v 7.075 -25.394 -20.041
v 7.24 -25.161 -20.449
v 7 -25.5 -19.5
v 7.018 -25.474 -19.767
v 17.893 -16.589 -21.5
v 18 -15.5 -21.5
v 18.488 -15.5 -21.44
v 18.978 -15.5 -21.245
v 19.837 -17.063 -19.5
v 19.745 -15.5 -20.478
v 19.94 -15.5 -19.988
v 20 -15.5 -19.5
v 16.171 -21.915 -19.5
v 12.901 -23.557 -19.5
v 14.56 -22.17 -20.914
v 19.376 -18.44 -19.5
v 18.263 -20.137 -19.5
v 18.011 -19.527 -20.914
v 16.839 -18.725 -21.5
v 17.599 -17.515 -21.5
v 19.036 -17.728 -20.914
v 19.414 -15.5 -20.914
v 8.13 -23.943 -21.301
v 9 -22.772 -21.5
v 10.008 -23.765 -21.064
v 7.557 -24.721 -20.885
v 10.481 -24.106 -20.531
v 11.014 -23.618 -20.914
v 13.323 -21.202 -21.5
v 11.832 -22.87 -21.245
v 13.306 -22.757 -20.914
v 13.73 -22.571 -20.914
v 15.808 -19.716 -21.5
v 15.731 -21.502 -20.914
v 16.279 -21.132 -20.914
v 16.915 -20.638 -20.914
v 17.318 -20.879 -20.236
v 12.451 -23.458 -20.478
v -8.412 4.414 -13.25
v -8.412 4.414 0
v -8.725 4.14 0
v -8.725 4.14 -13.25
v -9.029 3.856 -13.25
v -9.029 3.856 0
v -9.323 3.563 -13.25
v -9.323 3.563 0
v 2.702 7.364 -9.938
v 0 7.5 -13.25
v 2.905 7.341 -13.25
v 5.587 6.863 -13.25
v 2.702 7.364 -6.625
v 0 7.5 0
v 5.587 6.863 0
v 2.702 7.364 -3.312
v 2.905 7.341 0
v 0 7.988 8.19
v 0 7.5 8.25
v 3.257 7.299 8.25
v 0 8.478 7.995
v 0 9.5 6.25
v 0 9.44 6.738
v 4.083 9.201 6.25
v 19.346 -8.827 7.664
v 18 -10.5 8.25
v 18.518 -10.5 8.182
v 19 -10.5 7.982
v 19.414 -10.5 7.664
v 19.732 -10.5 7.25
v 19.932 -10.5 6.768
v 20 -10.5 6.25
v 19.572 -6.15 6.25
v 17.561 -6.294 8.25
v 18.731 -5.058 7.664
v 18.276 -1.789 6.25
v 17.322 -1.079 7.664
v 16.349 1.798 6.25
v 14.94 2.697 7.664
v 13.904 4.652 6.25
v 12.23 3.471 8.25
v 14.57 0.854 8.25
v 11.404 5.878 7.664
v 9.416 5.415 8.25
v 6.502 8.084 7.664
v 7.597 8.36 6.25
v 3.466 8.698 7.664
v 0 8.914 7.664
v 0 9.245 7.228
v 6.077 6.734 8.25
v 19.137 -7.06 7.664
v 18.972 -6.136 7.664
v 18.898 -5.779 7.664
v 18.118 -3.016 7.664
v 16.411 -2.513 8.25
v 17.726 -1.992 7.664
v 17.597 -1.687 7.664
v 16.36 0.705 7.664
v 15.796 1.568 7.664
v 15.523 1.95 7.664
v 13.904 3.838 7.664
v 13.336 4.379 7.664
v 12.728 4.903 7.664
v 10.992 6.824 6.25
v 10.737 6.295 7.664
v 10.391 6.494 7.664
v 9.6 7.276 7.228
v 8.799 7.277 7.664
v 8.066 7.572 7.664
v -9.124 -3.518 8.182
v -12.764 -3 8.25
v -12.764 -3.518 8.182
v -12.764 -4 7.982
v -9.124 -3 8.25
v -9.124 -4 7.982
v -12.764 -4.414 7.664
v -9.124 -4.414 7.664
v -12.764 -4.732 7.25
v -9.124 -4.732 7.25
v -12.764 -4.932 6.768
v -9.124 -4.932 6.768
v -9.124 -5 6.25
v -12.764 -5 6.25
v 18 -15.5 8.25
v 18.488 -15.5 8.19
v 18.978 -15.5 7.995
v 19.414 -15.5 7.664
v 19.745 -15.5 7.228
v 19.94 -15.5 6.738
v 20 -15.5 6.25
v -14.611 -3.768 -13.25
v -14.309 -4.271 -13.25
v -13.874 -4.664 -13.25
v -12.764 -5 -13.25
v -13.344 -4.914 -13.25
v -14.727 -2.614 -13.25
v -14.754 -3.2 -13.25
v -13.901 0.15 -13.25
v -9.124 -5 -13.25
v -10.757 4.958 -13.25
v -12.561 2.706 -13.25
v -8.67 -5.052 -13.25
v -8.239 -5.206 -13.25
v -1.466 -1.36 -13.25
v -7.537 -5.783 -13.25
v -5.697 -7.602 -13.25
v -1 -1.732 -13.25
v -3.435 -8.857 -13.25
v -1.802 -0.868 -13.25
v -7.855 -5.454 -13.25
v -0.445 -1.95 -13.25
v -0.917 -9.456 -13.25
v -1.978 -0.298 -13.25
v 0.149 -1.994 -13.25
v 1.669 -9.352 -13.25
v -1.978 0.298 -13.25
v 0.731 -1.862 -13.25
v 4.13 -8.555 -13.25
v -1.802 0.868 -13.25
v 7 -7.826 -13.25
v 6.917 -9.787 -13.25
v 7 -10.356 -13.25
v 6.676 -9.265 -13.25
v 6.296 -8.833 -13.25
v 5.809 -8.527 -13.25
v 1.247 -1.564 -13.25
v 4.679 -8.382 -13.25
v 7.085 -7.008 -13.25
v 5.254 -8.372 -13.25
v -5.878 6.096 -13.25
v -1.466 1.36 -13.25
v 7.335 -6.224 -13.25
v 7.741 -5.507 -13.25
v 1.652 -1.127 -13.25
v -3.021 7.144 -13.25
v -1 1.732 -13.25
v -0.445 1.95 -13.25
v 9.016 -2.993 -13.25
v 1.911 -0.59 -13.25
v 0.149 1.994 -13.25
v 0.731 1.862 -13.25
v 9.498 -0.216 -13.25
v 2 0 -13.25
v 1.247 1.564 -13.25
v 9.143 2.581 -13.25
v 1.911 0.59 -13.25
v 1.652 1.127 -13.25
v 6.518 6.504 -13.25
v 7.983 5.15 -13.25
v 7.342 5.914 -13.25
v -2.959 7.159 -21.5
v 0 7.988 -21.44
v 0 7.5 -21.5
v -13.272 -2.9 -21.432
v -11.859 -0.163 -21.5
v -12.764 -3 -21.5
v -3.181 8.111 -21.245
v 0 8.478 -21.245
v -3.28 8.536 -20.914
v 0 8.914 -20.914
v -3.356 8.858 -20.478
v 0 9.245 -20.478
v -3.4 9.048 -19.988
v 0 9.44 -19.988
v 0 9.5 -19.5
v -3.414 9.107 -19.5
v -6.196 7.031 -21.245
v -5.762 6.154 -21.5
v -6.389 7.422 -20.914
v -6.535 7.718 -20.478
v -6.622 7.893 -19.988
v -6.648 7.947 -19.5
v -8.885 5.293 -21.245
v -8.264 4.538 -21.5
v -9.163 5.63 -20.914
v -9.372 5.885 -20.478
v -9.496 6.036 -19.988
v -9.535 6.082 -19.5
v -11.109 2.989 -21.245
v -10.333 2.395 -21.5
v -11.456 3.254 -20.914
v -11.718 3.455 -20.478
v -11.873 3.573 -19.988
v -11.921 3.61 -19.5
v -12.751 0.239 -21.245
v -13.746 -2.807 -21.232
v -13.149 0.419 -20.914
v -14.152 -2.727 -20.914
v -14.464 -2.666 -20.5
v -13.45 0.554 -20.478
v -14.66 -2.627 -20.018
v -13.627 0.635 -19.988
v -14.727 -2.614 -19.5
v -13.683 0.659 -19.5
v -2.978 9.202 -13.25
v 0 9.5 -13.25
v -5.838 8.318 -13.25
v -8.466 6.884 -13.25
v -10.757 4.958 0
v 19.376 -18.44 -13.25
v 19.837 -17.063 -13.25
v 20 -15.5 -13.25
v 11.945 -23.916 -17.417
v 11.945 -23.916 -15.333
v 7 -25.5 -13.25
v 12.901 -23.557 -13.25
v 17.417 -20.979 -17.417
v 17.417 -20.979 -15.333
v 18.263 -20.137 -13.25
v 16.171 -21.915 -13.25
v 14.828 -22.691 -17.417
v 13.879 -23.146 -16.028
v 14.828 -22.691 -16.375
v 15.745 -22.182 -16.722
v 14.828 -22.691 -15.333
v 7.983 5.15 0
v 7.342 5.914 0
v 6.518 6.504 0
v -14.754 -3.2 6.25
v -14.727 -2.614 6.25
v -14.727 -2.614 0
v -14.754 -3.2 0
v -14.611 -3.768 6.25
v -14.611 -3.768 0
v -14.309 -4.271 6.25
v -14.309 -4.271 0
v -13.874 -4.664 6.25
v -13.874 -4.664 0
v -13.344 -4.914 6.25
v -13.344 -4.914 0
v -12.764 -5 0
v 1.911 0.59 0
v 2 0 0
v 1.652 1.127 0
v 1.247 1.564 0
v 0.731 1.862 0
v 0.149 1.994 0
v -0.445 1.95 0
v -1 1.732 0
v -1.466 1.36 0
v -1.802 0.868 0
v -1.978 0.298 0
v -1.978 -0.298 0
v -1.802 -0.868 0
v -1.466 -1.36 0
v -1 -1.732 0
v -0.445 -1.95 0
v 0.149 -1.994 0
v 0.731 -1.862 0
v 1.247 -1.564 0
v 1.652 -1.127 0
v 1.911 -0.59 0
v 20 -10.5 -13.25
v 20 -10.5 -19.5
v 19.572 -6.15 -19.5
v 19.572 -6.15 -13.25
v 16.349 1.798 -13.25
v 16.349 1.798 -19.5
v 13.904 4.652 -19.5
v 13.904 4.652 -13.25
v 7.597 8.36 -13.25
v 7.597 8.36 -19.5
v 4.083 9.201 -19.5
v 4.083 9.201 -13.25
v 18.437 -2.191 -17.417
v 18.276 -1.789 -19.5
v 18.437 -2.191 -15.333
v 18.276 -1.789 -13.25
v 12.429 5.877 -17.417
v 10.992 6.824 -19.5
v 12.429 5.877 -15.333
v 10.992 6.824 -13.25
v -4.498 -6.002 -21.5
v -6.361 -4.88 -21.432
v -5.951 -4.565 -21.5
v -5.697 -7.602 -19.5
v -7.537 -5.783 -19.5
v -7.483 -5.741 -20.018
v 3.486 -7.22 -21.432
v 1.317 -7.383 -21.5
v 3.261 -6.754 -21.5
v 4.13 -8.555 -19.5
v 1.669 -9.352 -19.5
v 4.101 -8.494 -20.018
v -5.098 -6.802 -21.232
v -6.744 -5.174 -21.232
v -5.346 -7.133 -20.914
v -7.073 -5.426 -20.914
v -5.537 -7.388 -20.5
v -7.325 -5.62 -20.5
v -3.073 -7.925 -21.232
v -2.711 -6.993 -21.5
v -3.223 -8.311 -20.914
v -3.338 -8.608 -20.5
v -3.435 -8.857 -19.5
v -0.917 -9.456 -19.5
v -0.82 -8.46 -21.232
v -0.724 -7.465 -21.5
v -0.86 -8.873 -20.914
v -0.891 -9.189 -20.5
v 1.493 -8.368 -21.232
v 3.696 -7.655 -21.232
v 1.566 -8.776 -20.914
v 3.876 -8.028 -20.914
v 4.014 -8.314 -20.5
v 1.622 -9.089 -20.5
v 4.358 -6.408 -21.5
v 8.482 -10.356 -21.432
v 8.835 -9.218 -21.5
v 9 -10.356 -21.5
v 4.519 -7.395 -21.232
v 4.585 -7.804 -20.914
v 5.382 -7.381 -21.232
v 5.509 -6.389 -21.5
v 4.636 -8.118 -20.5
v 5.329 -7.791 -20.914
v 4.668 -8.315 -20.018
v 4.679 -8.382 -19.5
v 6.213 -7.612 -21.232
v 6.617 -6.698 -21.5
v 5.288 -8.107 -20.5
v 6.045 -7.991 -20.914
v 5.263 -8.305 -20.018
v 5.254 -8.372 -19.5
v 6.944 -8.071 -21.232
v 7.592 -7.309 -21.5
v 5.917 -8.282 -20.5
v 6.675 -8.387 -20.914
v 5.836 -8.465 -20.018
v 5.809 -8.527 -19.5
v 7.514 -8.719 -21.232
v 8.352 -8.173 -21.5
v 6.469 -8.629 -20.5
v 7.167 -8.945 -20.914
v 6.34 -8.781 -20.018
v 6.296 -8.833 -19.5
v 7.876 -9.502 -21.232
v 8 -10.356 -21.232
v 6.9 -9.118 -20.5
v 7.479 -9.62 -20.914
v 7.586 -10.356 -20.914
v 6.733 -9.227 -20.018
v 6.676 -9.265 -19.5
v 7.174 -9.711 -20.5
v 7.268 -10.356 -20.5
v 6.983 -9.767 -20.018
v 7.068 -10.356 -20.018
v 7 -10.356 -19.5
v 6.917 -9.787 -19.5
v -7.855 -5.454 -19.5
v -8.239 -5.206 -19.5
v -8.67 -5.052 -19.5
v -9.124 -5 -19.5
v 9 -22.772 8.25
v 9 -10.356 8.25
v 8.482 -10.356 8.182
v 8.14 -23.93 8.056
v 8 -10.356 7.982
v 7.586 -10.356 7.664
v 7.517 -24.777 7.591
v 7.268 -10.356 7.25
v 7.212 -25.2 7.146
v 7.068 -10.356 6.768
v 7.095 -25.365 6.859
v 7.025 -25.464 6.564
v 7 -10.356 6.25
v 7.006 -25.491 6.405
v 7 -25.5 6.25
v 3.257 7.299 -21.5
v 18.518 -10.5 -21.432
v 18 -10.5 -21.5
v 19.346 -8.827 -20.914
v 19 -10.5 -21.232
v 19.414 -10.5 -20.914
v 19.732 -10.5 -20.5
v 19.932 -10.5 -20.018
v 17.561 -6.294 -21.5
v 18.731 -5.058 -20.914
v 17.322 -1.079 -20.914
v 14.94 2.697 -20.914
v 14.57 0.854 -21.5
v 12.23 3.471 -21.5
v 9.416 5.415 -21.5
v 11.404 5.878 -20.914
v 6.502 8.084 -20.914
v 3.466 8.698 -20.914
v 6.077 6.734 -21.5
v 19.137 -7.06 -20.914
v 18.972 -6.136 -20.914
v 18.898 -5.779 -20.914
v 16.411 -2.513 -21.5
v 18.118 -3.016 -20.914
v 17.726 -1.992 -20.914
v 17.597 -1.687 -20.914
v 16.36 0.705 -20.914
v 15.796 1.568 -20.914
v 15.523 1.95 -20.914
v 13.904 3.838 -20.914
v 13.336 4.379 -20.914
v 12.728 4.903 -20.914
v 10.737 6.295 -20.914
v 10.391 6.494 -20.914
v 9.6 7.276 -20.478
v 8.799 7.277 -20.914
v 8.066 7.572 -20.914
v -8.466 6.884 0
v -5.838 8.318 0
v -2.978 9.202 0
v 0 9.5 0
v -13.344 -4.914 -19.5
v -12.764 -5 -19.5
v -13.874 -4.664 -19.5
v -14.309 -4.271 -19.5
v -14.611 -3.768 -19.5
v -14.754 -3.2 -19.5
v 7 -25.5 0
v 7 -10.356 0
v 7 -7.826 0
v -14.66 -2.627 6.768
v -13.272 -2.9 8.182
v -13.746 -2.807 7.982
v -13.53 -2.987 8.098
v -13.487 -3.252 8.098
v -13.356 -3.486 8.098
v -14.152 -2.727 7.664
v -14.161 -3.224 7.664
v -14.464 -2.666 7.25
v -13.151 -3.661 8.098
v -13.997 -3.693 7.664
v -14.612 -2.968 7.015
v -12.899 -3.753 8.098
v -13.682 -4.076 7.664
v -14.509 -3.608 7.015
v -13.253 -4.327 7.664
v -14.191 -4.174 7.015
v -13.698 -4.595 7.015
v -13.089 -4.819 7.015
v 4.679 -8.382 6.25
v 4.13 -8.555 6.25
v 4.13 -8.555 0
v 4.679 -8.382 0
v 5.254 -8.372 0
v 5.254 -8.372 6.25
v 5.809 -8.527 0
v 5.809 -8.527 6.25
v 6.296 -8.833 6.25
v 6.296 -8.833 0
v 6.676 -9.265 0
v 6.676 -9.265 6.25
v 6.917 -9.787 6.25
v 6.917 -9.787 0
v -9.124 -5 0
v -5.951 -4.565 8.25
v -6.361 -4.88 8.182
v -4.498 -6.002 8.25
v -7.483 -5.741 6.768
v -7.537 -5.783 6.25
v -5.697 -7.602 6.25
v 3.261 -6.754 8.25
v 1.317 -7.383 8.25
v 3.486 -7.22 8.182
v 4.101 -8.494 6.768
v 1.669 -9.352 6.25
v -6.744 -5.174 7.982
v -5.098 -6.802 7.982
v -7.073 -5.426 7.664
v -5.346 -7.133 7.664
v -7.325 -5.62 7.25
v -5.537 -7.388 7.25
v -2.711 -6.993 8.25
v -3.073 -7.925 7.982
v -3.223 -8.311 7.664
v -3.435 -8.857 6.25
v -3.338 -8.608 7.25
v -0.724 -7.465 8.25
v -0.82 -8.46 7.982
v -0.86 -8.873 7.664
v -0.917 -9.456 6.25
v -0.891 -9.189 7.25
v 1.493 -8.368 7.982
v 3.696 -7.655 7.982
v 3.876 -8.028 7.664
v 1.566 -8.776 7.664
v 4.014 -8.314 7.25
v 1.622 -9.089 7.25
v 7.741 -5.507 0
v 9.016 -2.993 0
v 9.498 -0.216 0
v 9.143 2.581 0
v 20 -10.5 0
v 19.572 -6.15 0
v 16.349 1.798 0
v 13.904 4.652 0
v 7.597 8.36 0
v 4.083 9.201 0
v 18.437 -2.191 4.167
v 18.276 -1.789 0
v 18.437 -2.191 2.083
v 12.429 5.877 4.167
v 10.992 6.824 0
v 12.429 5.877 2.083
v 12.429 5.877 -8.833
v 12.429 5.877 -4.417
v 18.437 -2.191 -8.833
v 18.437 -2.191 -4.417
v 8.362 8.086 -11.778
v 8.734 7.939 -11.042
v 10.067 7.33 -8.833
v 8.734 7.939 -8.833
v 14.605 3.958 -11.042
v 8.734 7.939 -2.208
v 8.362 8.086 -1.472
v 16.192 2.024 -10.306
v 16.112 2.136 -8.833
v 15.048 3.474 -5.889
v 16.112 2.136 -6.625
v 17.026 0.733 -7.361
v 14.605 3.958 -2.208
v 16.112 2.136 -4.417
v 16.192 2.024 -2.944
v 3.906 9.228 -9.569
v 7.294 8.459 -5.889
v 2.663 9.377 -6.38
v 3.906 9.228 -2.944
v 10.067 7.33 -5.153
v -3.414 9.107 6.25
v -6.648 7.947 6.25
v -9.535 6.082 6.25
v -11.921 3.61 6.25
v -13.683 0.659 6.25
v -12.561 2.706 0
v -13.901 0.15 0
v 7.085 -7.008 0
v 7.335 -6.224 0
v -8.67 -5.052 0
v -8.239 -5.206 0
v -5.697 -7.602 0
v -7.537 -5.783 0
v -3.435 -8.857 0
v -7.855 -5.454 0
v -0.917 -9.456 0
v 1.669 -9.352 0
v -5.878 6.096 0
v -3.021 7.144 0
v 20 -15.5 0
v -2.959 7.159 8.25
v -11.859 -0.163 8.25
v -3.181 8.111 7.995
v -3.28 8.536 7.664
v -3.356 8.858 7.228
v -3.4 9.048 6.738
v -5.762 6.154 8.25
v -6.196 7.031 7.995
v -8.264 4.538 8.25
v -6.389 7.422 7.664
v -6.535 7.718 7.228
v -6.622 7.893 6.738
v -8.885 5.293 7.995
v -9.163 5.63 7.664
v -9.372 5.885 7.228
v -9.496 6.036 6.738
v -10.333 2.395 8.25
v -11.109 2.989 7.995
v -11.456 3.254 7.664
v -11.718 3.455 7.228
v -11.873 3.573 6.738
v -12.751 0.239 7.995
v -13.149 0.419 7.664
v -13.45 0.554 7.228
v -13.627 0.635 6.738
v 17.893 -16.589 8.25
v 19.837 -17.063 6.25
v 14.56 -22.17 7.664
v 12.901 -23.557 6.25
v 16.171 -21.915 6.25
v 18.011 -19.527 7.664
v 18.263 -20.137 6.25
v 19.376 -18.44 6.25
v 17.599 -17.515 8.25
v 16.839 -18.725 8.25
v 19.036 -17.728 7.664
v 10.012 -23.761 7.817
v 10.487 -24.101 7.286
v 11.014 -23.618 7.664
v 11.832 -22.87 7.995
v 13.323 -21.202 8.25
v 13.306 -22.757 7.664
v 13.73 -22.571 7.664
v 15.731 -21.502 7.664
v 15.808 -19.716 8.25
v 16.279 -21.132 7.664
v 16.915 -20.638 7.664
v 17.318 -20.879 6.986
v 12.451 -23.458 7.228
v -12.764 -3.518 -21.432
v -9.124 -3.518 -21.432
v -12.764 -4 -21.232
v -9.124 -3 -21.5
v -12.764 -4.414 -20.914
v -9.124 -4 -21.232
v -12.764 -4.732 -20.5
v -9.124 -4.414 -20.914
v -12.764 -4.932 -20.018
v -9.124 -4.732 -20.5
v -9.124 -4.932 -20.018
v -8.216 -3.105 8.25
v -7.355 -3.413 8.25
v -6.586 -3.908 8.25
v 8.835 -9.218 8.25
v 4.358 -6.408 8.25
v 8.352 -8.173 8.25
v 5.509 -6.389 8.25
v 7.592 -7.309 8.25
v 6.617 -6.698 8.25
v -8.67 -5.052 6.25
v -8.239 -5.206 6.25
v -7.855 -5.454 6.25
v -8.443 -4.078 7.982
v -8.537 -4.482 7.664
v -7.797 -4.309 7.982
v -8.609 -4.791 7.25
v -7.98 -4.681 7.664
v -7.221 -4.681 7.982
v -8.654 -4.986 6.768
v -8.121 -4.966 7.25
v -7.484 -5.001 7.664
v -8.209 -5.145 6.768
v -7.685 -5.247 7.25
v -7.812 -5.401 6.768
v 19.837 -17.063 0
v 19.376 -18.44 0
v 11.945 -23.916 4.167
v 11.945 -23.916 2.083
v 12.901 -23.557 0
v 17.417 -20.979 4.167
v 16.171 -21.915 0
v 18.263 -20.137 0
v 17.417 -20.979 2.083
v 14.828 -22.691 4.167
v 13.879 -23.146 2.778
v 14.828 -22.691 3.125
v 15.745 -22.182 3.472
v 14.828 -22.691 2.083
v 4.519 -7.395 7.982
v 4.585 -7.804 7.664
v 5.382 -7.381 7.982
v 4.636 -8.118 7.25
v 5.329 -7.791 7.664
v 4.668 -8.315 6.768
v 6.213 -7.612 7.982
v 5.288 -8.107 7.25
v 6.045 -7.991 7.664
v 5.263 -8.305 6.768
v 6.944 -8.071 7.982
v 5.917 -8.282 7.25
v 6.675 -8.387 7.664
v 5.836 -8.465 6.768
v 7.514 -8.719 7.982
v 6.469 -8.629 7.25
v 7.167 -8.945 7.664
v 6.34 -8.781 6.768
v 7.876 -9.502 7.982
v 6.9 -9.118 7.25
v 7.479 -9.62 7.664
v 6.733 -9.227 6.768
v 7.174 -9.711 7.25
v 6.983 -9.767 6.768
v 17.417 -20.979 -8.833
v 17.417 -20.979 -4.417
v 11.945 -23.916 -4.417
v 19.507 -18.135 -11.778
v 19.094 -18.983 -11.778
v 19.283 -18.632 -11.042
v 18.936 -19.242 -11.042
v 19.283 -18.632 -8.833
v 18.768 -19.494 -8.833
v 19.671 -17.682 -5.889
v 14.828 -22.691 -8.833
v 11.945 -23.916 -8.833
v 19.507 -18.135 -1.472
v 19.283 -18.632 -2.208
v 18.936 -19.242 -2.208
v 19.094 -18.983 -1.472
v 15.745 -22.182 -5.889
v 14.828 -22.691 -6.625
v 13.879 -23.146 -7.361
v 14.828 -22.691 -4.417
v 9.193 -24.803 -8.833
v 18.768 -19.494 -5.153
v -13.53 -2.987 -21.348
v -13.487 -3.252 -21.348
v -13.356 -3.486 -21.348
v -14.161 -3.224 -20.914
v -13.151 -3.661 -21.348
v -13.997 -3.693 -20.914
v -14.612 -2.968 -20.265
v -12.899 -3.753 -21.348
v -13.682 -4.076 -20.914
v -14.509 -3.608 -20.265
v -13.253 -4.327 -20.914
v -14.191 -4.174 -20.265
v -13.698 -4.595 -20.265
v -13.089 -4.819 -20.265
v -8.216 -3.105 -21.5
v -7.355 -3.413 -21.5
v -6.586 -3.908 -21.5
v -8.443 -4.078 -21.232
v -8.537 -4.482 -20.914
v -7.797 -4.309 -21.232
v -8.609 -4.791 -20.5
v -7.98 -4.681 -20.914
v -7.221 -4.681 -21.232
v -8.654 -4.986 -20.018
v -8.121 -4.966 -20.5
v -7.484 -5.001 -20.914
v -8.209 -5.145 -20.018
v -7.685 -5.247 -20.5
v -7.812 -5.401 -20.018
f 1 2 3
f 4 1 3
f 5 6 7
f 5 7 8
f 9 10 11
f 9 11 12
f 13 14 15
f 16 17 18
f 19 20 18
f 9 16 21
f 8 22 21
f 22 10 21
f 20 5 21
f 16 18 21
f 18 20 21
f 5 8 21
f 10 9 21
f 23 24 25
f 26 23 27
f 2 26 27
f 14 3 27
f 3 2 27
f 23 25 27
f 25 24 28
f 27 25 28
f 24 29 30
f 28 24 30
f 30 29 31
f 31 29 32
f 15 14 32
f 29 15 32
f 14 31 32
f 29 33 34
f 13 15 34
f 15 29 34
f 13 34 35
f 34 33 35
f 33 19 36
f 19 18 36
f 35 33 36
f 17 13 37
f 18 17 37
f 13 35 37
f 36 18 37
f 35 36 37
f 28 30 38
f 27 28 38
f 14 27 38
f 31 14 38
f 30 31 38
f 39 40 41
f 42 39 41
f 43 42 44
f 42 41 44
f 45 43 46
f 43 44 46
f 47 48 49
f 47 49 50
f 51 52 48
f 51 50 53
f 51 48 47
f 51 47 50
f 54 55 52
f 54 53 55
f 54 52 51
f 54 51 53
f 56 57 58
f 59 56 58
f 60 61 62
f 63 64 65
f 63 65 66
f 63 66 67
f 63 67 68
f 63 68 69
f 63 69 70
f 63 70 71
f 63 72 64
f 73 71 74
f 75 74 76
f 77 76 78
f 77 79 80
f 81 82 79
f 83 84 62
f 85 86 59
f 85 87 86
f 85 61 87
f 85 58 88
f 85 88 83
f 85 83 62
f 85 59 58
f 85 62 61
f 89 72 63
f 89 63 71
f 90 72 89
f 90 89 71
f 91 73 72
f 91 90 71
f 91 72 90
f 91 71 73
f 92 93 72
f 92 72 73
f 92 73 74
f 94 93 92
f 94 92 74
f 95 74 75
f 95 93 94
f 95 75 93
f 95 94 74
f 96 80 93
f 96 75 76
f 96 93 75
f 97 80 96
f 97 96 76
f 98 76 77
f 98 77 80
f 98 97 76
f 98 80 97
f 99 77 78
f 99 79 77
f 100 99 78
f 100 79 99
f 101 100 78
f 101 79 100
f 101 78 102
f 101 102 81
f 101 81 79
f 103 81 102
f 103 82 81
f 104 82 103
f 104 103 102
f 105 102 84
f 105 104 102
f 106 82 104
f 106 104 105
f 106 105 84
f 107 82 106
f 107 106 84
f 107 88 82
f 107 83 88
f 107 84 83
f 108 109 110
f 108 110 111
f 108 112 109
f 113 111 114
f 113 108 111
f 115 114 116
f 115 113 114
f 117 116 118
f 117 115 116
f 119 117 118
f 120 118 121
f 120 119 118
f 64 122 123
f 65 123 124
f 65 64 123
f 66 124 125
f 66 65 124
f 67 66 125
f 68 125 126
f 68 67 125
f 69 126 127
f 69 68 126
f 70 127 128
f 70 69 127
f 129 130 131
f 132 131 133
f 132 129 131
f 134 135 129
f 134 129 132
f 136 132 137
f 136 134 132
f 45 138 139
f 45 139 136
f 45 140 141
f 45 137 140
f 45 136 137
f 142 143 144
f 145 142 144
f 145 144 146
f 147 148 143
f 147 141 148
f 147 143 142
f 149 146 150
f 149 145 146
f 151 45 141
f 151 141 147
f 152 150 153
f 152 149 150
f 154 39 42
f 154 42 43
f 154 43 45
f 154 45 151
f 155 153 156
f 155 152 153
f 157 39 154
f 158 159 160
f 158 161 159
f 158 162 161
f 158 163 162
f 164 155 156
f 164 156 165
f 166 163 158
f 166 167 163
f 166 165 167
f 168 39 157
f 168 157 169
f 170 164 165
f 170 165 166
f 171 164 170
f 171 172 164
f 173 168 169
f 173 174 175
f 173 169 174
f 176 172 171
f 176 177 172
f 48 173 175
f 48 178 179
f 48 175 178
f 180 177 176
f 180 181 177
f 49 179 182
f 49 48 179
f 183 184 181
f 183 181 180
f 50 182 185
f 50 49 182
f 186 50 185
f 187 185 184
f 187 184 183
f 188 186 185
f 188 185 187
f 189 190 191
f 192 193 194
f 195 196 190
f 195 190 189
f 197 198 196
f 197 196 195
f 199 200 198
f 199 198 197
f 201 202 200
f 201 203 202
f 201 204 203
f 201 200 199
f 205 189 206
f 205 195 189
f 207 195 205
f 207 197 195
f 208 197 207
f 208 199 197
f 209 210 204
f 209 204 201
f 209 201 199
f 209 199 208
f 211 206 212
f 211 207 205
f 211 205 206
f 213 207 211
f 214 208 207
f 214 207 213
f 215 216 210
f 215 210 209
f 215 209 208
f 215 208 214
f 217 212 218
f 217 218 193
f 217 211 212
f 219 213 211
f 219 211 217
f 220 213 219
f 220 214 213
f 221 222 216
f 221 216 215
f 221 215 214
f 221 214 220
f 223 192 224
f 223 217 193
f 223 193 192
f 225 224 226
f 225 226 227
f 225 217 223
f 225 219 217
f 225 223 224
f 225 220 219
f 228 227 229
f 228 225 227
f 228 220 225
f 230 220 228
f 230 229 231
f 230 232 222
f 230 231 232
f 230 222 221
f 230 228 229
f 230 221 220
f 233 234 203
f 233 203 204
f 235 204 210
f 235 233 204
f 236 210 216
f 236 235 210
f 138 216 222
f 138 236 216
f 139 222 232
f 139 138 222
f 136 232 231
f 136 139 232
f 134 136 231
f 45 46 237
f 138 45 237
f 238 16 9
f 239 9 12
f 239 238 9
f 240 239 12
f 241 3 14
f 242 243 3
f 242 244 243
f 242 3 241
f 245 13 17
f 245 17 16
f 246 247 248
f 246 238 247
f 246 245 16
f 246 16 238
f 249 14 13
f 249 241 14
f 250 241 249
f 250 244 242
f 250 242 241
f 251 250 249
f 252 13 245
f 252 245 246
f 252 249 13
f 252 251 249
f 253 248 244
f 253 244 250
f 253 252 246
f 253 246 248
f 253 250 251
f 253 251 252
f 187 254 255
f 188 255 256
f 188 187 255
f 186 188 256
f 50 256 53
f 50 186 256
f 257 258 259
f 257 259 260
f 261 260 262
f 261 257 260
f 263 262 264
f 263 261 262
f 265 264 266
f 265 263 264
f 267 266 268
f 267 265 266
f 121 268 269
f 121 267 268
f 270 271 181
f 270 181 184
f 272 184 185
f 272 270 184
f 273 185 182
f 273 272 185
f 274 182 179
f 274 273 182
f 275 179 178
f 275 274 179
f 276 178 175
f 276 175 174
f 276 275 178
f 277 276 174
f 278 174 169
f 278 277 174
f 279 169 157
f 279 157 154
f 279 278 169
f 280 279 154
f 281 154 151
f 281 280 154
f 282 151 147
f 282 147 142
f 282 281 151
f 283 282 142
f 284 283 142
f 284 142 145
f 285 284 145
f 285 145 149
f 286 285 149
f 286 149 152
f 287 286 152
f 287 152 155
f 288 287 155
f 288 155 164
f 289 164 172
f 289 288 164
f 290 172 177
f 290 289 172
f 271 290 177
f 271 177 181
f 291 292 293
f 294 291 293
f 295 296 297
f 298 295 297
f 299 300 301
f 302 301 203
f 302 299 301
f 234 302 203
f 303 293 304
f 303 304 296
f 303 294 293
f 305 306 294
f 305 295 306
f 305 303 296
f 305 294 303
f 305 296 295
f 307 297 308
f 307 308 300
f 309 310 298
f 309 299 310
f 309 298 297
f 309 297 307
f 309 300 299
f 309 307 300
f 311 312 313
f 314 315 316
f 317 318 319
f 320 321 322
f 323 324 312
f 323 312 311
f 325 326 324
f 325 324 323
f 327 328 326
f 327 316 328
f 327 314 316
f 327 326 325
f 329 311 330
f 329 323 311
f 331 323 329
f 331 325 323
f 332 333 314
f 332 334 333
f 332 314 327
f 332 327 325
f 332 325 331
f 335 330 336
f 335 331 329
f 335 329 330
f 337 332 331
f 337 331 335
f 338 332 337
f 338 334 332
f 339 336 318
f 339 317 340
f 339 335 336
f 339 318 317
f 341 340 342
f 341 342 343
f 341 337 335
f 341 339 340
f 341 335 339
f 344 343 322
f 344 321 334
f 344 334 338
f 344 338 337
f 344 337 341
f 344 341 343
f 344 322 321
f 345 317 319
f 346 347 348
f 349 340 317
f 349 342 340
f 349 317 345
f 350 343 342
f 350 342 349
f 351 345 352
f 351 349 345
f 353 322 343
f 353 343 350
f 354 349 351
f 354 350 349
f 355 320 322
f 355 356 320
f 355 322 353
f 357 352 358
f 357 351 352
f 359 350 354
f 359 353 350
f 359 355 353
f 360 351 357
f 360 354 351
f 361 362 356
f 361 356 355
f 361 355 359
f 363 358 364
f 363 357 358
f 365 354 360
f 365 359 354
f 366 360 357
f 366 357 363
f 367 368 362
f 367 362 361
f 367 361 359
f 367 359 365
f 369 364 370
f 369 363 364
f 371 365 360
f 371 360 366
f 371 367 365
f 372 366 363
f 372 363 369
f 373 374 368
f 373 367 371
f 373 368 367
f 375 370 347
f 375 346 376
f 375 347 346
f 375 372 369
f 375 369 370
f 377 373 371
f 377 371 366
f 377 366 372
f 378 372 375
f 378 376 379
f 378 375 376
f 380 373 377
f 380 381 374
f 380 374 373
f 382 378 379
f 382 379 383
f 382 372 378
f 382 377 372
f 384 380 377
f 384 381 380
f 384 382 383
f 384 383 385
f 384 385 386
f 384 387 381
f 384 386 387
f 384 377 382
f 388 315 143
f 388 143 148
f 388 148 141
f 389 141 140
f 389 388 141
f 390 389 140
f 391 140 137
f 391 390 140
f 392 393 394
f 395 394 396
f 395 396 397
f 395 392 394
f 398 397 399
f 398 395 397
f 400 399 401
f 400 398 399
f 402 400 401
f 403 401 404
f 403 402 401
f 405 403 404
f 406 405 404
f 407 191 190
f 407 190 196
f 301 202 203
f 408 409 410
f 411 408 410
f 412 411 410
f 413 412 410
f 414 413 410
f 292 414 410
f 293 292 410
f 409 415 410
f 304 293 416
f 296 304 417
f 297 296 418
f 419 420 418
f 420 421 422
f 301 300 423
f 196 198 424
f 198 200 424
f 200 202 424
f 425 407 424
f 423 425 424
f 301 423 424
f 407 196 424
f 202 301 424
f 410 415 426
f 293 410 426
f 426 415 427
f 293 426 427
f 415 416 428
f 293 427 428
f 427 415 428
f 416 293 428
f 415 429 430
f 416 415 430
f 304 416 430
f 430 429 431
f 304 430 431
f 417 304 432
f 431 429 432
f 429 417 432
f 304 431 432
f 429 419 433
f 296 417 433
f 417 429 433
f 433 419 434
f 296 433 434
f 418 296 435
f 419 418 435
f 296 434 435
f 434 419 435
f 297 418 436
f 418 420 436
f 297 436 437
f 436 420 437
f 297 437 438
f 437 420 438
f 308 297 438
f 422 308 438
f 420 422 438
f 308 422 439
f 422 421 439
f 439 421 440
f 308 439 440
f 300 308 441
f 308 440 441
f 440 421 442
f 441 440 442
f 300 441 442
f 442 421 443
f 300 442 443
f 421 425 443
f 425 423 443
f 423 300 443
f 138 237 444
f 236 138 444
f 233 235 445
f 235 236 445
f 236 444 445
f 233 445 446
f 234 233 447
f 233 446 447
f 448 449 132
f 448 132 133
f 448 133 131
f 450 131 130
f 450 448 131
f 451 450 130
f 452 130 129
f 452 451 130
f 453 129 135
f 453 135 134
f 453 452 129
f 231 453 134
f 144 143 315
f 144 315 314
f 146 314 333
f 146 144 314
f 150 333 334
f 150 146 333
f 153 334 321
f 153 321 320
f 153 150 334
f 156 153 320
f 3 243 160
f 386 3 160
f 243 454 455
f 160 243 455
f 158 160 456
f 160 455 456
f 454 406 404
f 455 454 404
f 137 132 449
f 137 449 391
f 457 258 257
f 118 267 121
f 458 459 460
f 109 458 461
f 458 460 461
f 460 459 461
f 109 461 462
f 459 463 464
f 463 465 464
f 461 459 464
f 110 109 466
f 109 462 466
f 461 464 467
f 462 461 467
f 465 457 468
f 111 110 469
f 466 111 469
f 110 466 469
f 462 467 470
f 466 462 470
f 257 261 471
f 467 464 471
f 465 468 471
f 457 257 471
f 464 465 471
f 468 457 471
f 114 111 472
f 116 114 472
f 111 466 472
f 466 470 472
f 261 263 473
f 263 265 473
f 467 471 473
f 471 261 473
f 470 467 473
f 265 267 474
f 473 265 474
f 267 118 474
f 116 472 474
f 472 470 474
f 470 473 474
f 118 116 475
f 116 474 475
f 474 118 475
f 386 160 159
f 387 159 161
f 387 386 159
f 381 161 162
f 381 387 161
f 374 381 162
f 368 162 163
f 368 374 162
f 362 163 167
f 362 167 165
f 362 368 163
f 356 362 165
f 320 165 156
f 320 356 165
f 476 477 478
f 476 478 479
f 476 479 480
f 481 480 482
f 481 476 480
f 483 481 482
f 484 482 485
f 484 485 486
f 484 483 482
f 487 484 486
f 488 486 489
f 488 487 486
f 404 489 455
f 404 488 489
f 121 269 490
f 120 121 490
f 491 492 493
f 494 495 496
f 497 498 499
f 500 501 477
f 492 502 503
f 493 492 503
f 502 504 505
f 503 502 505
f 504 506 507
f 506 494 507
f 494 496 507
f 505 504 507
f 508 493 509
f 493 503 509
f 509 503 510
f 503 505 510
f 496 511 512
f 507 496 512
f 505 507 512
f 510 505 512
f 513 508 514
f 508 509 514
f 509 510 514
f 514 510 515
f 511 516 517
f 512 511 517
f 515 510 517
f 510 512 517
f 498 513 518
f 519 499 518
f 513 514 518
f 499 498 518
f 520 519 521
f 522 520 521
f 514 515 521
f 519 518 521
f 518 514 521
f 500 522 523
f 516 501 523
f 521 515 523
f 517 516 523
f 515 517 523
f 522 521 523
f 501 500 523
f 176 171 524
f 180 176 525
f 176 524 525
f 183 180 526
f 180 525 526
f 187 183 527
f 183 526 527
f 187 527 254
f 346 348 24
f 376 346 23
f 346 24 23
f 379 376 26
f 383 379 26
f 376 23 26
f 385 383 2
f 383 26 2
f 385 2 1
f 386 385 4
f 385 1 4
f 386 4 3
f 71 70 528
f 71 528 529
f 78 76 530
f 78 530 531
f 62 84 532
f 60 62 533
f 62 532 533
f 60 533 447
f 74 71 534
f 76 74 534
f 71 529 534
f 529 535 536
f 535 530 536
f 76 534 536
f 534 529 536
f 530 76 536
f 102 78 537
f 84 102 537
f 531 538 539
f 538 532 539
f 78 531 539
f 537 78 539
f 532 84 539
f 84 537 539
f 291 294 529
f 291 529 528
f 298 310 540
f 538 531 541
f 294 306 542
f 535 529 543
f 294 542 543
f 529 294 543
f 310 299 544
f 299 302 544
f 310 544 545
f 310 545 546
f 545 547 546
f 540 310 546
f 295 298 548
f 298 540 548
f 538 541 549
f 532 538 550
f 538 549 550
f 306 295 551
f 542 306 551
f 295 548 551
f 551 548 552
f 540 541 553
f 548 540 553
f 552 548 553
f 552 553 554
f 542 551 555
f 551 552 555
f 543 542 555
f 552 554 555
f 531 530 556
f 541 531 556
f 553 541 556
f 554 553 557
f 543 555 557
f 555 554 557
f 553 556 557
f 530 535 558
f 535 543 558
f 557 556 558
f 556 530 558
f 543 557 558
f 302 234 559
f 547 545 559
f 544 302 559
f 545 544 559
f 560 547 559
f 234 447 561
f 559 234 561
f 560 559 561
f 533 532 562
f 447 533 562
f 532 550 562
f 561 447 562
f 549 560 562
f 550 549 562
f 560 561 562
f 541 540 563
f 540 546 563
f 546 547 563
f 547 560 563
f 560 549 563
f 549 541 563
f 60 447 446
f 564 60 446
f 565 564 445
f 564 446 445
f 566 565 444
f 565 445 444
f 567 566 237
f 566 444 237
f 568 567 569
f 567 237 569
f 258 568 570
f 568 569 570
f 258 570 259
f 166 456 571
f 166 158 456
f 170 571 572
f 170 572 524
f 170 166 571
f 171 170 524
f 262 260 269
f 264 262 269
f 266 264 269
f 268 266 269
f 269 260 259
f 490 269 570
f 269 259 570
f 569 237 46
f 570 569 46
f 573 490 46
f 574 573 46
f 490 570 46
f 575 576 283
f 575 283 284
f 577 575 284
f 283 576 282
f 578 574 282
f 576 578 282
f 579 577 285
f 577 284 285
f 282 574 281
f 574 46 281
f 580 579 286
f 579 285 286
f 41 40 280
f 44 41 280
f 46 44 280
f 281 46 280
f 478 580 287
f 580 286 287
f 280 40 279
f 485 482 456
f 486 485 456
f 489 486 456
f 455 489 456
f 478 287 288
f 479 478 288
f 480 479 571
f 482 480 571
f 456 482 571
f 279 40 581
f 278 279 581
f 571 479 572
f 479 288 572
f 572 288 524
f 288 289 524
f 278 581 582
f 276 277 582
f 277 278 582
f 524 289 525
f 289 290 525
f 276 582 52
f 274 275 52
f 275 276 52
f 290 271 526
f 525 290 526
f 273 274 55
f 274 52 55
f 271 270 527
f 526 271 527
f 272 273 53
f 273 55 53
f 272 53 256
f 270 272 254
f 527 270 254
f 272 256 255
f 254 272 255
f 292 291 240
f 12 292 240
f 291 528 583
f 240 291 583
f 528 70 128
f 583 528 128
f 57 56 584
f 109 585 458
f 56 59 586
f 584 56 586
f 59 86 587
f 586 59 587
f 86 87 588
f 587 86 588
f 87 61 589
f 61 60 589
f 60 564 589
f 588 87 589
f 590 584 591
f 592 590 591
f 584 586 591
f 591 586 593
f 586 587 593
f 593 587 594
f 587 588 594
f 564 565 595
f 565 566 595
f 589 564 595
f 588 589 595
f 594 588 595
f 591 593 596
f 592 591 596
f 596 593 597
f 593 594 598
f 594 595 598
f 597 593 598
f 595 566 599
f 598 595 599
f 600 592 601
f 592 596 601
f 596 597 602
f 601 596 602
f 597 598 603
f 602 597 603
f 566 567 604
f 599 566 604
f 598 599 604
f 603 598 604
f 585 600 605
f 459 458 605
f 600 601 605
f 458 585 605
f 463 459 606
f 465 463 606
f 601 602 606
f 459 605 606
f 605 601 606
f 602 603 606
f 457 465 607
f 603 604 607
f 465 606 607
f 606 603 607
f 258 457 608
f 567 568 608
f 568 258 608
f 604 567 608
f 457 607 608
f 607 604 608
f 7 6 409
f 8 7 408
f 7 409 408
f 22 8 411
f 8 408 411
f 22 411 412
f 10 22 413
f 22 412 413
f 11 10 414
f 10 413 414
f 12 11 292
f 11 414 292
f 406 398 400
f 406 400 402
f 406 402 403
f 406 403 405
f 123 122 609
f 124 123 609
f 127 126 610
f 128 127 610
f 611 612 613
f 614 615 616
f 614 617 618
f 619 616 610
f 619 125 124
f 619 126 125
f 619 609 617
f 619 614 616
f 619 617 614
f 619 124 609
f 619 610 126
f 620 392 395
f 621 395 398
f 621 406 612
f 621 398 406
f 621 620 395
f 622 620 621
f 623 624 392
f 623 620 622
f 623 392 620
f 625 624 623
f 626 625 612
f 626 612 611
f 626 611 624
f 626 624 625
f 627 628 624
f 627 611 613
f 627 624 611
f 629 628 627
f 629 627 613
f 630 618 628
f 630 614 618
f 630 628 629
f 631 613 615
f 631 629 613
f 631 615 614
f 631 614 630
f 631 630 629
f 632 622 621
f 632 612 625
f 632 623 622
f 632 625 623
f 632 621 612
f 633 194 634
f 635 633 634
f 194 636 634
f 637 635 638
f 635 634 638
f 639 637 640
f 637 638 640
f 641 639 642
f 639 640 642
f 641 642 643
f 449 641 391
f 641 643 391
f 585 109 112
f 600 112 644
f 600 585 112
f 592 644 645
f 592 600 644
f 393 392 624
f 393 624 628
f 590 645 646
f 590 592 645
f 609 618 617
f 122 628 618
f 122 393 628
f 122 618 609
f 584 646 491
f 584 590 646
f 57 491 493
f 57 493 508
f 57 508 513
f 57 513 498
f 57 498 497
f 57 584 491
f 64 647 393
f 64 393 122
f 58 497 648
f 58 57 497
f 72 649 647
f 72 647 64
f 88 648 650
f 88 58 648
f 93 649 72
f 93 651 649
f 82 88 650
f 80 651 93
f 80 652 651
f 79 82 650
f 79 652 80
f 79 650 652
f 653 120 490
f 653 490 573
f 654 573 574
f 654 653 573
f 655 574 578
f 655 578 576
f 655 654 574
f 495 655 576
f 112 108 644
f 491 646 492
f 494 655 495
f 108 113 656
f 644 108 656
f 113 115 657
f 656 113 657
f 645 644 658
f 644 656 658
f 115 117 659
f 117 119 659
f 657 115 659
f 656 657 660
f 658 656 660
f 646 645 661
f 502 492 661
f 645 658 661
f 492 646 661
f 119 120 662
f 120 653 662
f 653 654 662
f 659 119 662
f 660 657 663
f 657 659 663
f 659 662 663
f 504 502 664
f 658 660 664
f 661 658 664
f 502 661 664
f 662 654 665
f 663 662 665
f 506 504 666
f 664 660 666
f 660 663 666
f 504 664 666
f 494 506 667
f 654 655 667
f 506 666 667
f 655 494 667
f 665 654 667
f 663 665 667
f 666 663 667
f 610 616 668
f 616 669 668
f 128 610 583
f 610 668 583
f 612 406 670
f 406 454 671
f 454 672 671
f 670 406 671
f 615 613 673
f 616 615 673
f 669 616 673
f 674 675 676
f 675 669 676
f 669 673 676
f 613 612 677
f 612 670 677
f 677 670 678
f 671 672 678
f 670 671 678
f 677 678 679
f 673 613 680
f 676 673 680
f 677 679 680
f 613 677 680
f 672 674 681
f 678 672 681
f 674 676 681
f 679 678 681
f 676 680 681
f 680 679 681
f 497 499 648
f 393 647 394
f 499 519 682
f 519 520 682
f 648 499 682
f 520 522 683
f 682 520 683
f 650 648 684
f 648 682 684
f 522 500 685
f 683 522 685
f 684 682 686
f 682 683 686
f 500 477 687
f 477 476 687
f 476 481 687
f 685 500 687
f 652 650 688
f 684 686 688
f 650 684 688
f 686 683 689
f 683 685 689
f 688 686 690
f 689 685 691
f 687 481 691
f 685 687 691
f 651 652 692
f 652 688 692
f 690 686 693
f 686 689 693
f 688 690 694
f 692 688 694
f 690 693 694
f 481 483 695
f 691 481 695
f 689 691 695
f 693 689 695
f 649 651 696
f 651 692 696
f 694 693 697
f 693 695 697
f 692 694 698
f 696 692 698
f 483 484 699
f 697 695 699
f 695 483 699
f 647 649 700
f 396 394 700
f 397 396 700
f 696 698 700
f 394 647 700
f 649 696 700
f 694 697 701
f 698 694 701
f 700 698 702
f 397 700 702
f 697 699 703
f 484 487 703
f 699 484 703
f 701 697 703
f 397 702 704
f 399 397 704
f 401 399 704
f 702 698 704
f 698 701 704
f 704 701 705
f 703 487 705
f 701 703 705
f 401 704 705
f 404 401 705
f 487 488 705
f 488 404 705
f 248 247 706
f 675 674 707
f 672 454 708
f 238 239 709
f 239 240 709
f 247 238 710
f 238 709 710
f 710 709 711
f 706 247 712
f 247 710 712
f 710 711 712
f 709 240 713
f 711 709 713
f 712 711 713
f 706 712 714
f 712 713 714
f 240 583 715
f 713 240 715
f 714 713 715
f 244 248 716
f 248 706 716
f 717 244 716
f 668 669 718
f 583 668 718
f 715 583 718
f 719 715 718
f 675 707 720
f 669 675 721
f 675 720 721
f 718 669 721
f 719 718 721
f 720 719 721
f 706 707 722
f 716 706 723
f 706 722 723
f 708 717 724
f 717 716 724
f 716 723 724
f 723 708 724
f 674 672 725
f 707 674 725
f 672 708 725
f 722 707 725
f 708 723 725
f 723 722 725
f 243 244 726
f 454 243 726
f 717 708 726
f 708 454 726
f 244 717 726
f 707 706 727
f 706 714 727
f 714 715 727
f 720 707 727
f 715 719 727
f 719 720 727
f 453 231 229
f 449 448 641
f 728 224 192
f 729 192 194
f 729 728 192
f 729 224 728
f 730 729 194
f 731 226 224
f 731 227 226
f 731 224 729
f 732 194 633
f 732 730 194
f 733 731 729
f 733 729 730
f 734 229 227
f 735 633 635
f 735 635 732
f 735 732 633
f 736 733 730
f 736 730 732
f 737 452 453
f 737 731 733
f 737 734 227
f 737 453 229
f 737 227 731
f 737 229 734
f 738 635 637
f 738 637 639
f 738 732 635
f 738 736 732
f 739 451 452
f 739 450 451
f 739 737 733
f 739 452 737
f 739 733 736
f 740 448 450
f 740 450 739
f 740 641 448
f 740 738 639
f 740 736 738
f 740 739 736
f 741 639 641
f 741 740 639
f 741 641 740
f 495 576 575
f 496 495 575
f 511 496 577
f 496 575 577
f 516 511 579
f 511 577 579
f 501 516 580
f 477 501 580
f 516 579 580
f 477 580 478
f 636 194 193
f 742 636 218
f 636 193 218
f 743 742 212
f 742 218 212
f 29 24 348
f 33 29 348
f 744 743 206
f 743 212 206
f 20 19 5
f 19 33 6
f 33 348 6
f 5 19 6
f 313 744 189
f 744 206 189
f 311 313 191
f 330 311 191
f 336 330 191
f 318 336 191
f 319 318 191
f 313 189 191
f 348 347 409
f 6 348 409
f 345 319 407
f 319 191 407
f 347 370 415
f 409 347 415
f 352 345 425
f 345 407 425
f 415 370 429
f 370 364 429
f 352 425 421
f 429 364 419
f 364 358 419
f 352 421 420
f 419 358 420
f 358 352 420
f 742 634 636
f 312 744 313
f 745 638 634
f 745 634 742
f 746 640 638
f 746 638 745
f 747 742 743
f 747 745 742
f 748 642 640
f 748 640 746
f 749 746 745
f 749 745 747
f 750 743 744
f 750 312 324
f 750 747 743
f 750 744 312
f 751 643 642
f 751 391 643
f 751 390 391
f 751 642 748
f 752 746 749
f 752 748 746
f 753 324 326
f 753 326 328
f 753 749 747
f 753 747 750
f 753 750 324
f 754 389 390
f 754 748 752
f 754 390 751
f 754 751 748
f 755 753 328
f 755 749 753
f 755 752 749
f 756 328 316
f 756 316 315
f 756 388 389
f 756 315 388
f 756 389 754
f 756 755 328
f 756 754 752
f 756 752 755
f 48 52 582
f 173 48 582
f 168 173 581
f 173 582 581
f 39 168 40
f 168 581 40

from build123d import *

# Parameters (mm, degrees)
SKETCH1_R            = 2
BOSS_EXTRUDE1_DEPTH  = 8.25
FILLET1_R            = 2
SKETCH1_3_R          = 2
BOSS_EXTRUDE2_DEPTH  = 13.25
FILLET1_OF_MIRROR1_R = 2
BOSS_EXTRUDE3_DEPTH  = 13.25
FILLET5_R            = 4
FILLET6_R            = 2


with BuildPart() as part:
    # Sketch1 → Boss-Extrude1 (new body)
    with BuildSketch(Plane.XY):
        with BuildLine():
            Line((7, -15.5), (7, -25.5))
            add(Edge.make_bspline(
                [(7, -25.5), (10.542331325, -24.196544486), (20, -22.646886742), (20, -15.5)],
                knots=[0, 0, 0, 0, 1, 1, 1, 1], degree=3))
            Line((20, -15.5), (20, -10.5))
            add(Edge.make_bspline(
                [(20, -10.5), (20, -3.471131344), (16.29951196, 9.5), (0, 9.5)],
                knots=[0, 0, 0, 0, 1, 1, 1, 1], degree=3))
            ThreePointArc((0, 9.5), (-10.431323023, 5.282403127), (-15, -5))
            Line((-15, -5), (-8.077747211, -5))
            ThreePointArc((-8.077747211, -5), (-0.892381106, -9.457994288), (7, -6.422616289))
            Line((7, -6.422616289), (7, -15.5))
        make_face()
        Circle(SKETCH1_R, mode=Mode.SUBTRACT)
        Circle(SKETCH1_R)
    boss_extrude1 = extrude(amount=BOSS_EXTRUDE1_DEPTH)

    # Fillet1
    fillet1_edges = [part.edges().sort_by_distance(p)[0] for p in [
        (7, -6.422616289, 4.125),
        (-8.077747211, -5, 4.125),
        (-15, -5, 4.125),
    ]]
    fillet(fillet1_edges, radius=FILLET1_R)

    # Sketch1<3> → Boss-Extrude2 (add)
    with BuildSketch(Plane.XY):
        Circle(SKETCH1_3_R)
    extrude(amount=-BOSS_EXTRUDE2_DEPTH)

    # Mirror1: Boss-Extrude1 across plane
    add(boss_extrude1.mirror(Plane(origin=(0, 0, -6.625), x_dir=(1, 0, 0), z_dir=(0, 0, -1))))

    # Fillet1 of Mirror1
    fillet1_of_mirror1_edges = [part.edges().sort_by_distance(p)[0] for p in [
        (7, -6.422616289, -17.375),
        (-8.077747211, -5, -17.375),
        (-15, -5, -17.375),
    ]]
    fillet(fillet1_of_mirror1_edges, radius=FILLET1_OF_MIRROR1_R)

    # Sketch2 → Boss-Extrude3 (add)
    with BuildSketch(Plane(origin=(0, 0, 0), x_dir=(-1, 0, 0), z_dir=(0, 0, -1))):
        with BuildLine():
            Line((-7, -25.5), (-7, -10.356157589))
            Line((-7, -10.356157589), (-7, -6.892055973))
            ThreePointArc((-7, -6.892055973), (-8.464101615, -8.356157589), (-9, -10.356157589))
            Line((-9, -10.356157589), (-9, -22.771805639))
            add(Edge.make_bspline(
                [(-18, -15.5), (-18, -15.755810099), (-17.96384044, -16.287511283), (-17.769644463, -17.176482985), (-17.326663811, -18.150730827), (-16.473613849, -19.194167826), (-14.905607021, -20.459045473), (-12.82414289, -21.481239618), (-10.597371428, -22.278497003), (-9.539012997, -22.607951452), (-9, -22.771805639)],
                knots=[0, 0, 0, 0, 0.050516154, 0.101032309, 0.202064618, 0.303096927, 0.404129236, 0.606193854, 0.707226163, 0.808258472, 0.808258472, 0.808258472, 0.808258472], degree=3))
            Line((-18, -15.5), (-18, -10.5))
            add(Edge.make_bspline(
                [(-6.962022671, 6.463763635), (-7.052846693, 6.433357714), (-7.813282932, 6.171704453), (-9.764374575, 5.337056232), (-12.300959997, 3.59990947), (-14.595833208, 1.024905795), (-16.245773011, -1.88869544), (-17.142002116, -4.439111746), (-17.608268155, -6.440579265), (-17.843029574, -7.893234579), (-17.952096873, -9.034515744), (-17.993489628, -9.897259581), (-18, -10.296370516), (-18, -10.5)],
                knots=[0.179104723, 0.179104723, 0.179104723, 0.179104723, 0.1875, 0.25, 0.375, 0.5, 0.625, 0.75, 0.8125, 0.875, 0.9375, 0.96875, 1, 1, 1, 1], degree=3))
            ThreePointArc((-6.962022671, 6.463763635), (-3.797646999, 8.707920376), (0, 9.5))
            add(Edge.make_bspline(
                [(0, 9.5), (-16.29951196, 9.5), (-20, -3.471131344), (-20, -10.5)],
                knots=[0, 0, 0, 0, 1, 1, 1, 1], degree=3))
            Line((-20, -10.5), (-20, -15.5))
            add(Edge.make_bspline(
                [(-20, -15.5), (-20, -22.646886742), (-10.542331325, -24.196544486), (-7, -25.5)],
                knots=[0, 0, 0, 0, 1, 1, 1, 1], degree=3))
        make_face()
        with BuildLine():
            ThreePointArc((-9, -10.356157589), (-8.464101615, -8.356157589), (-7, -6.892055973))
            Line((-7, -6.892055973), (-7, -6.422616289))
            ThreePointArc((-7, -6.422616289), (-9.499958745, 0.027997239), (-6.962022671, 6.463763635))
            add(Edge.make_bspline(
                [(-6.962022671, 6.463763635), (-7.052846693, 6.433357714), (-7.813282932, 6.171704453), (-9.764374575, 5.337056232), (-12.300959997, 3.59990947), (-14.595833208, 1.024905795), (-16.245773011, -1.88869544), (-17.142002116, -4.439111746), (-17.608268155, -6.440579265), (-17.843029574, -7.893234579), (-17.952096873, -9.034515744), (-17.993489628, -9.897259581), (-18, -10.296370516), (-18, -10.5)],
                knots=[0.179104723, 0.179104723, 0.179104723, 0.179104723, 0.1875, 0.25, 0.375, 0.5, 0.625, 0.75, 0.8125, 0.875, 0.9375, 0.96875, 1, 1, 1, 1], degree=3))
            Line((-18, -10.5), (-18, -15.5))
            add(Edge.make_bspline(
                [(-18, -15.5), (-18, -15.755810099), (-17.96384044, -16.287511283), (-17.769644463, -17.176482985), (-17.326663811, -18.150730827), (-16.473613849, -19.194167826), (-14.905607021, -20.459045473), (-12.82414289, -21.481239618), (-10.597371428, -22.278497003), (-9.539012997, -22.607951452), (-9, -22.771805639)],
                knots=[0, 0, 0, 0, 0.050516154, 0.101032309, 0.202064618, 0.303096927, 0.404129236, 0.606193854, 0.707226163, 0.808258472, 0.808258472, 0.808258472, 0.808258472], degree=3))
            Line((-9, -22.771805639), (-9, -10.356157589))
        make_face()
        with BuildLine():
            ThreePointArc((0, 9.5), (-3.797646999, 8.707920376), (-6.962022671, 6.463763635))
            add(Edge.make_bspline(
                [(0, 7.5), (-0.46330758, 7.5), (-1.408127817, 7.476315508), (-3.148637138, 7.339831525), (-5.045865316, 7.030251245), (-6.376692574, 6.659719511), (-6.962022671, 6.463763635)],
                knots=[0, 0, 0, 0, 0.03125, 0.0625, 0.125, 0.179104723, 0.179104723, 0.179104723, 0.179104723], degree=3))
            ThreePointArc((0, 7.5), (4.480264496, 6.704136669), (8.41232664, 4.413928013))
            ThreePointArc((8.41232664, 4.413928013), (4.915164488, 8.129646859), (0, 9.5))
        make_face()
        with BuildLine():
            ThreePointArc((10.756875796, 4.957912553), (5.83825606, 8.317928453), (0, 9.5))
            ThreePointArc((0, 9.5), (4.915164488, 8.129646859), (8.41232664, 4.413928013))
            ThreePointArc((8.41232664, 4.413928013), (8.878084444, 3.999472118), (9.323449498, 3.563176359))
            Line((9.323449498, 3.563176359), (10.756875796, 4.957912553))
        make_face()
    extrude(amount=BOSS_EXTRUDE3_DEPTH)

    # Fillet5
    fillet5_edges = [part.edges().sort_by_distance(p)[0] for p in [
        (6.962022671, 6.463763635, -6.625),
        (7, -6.422616289, -6.625),
    ]]
    fillet(fillet5_edges, radius=FILLET5_R)

    # Fillet6
    fillet6_edges = [part.edges().sort_by_distance(p)[0] for p in [
        (15.288594231, -22.445576253, 8.25),
        (20, -13, 8.25),
        (14.507114548, 4.059861745, 8.25),
        (-10.944293973, -5, 8.25),
        (-9.53465116, 6.082286189, 8.25),
        (7, -17.928078794, 8.25),
        (-2.196224683, -9.24265098, 8.25),
        (-14.30901072, -4.270556616, 8.25),
        (6.063219066, -8.662178481, 8.25),
        (-8.239492059, -5.206291187, 8.25),
        (14.507114548, 4.059861745, -21.5),
        (20, -13, -21.5),
        (15.288594231, -22.445576253, -21.5),
        (-9.53465116, 6.082286189, -21.5),
        (-10.944293973, -5, -21.5),
        (7, -17.928078794, -21.5),
        (-2.196224683, -9.24265098, -21.5),
        (-14.30901072, -4.270556616, -21.5),
        (6.063219066, -8.662178481, -21.5),
        (-8.239492059, -5.206291187, -21.5),
    ]]
    fillet(fillet6_edges, radius=FILLET6_R)


solid = part.part
